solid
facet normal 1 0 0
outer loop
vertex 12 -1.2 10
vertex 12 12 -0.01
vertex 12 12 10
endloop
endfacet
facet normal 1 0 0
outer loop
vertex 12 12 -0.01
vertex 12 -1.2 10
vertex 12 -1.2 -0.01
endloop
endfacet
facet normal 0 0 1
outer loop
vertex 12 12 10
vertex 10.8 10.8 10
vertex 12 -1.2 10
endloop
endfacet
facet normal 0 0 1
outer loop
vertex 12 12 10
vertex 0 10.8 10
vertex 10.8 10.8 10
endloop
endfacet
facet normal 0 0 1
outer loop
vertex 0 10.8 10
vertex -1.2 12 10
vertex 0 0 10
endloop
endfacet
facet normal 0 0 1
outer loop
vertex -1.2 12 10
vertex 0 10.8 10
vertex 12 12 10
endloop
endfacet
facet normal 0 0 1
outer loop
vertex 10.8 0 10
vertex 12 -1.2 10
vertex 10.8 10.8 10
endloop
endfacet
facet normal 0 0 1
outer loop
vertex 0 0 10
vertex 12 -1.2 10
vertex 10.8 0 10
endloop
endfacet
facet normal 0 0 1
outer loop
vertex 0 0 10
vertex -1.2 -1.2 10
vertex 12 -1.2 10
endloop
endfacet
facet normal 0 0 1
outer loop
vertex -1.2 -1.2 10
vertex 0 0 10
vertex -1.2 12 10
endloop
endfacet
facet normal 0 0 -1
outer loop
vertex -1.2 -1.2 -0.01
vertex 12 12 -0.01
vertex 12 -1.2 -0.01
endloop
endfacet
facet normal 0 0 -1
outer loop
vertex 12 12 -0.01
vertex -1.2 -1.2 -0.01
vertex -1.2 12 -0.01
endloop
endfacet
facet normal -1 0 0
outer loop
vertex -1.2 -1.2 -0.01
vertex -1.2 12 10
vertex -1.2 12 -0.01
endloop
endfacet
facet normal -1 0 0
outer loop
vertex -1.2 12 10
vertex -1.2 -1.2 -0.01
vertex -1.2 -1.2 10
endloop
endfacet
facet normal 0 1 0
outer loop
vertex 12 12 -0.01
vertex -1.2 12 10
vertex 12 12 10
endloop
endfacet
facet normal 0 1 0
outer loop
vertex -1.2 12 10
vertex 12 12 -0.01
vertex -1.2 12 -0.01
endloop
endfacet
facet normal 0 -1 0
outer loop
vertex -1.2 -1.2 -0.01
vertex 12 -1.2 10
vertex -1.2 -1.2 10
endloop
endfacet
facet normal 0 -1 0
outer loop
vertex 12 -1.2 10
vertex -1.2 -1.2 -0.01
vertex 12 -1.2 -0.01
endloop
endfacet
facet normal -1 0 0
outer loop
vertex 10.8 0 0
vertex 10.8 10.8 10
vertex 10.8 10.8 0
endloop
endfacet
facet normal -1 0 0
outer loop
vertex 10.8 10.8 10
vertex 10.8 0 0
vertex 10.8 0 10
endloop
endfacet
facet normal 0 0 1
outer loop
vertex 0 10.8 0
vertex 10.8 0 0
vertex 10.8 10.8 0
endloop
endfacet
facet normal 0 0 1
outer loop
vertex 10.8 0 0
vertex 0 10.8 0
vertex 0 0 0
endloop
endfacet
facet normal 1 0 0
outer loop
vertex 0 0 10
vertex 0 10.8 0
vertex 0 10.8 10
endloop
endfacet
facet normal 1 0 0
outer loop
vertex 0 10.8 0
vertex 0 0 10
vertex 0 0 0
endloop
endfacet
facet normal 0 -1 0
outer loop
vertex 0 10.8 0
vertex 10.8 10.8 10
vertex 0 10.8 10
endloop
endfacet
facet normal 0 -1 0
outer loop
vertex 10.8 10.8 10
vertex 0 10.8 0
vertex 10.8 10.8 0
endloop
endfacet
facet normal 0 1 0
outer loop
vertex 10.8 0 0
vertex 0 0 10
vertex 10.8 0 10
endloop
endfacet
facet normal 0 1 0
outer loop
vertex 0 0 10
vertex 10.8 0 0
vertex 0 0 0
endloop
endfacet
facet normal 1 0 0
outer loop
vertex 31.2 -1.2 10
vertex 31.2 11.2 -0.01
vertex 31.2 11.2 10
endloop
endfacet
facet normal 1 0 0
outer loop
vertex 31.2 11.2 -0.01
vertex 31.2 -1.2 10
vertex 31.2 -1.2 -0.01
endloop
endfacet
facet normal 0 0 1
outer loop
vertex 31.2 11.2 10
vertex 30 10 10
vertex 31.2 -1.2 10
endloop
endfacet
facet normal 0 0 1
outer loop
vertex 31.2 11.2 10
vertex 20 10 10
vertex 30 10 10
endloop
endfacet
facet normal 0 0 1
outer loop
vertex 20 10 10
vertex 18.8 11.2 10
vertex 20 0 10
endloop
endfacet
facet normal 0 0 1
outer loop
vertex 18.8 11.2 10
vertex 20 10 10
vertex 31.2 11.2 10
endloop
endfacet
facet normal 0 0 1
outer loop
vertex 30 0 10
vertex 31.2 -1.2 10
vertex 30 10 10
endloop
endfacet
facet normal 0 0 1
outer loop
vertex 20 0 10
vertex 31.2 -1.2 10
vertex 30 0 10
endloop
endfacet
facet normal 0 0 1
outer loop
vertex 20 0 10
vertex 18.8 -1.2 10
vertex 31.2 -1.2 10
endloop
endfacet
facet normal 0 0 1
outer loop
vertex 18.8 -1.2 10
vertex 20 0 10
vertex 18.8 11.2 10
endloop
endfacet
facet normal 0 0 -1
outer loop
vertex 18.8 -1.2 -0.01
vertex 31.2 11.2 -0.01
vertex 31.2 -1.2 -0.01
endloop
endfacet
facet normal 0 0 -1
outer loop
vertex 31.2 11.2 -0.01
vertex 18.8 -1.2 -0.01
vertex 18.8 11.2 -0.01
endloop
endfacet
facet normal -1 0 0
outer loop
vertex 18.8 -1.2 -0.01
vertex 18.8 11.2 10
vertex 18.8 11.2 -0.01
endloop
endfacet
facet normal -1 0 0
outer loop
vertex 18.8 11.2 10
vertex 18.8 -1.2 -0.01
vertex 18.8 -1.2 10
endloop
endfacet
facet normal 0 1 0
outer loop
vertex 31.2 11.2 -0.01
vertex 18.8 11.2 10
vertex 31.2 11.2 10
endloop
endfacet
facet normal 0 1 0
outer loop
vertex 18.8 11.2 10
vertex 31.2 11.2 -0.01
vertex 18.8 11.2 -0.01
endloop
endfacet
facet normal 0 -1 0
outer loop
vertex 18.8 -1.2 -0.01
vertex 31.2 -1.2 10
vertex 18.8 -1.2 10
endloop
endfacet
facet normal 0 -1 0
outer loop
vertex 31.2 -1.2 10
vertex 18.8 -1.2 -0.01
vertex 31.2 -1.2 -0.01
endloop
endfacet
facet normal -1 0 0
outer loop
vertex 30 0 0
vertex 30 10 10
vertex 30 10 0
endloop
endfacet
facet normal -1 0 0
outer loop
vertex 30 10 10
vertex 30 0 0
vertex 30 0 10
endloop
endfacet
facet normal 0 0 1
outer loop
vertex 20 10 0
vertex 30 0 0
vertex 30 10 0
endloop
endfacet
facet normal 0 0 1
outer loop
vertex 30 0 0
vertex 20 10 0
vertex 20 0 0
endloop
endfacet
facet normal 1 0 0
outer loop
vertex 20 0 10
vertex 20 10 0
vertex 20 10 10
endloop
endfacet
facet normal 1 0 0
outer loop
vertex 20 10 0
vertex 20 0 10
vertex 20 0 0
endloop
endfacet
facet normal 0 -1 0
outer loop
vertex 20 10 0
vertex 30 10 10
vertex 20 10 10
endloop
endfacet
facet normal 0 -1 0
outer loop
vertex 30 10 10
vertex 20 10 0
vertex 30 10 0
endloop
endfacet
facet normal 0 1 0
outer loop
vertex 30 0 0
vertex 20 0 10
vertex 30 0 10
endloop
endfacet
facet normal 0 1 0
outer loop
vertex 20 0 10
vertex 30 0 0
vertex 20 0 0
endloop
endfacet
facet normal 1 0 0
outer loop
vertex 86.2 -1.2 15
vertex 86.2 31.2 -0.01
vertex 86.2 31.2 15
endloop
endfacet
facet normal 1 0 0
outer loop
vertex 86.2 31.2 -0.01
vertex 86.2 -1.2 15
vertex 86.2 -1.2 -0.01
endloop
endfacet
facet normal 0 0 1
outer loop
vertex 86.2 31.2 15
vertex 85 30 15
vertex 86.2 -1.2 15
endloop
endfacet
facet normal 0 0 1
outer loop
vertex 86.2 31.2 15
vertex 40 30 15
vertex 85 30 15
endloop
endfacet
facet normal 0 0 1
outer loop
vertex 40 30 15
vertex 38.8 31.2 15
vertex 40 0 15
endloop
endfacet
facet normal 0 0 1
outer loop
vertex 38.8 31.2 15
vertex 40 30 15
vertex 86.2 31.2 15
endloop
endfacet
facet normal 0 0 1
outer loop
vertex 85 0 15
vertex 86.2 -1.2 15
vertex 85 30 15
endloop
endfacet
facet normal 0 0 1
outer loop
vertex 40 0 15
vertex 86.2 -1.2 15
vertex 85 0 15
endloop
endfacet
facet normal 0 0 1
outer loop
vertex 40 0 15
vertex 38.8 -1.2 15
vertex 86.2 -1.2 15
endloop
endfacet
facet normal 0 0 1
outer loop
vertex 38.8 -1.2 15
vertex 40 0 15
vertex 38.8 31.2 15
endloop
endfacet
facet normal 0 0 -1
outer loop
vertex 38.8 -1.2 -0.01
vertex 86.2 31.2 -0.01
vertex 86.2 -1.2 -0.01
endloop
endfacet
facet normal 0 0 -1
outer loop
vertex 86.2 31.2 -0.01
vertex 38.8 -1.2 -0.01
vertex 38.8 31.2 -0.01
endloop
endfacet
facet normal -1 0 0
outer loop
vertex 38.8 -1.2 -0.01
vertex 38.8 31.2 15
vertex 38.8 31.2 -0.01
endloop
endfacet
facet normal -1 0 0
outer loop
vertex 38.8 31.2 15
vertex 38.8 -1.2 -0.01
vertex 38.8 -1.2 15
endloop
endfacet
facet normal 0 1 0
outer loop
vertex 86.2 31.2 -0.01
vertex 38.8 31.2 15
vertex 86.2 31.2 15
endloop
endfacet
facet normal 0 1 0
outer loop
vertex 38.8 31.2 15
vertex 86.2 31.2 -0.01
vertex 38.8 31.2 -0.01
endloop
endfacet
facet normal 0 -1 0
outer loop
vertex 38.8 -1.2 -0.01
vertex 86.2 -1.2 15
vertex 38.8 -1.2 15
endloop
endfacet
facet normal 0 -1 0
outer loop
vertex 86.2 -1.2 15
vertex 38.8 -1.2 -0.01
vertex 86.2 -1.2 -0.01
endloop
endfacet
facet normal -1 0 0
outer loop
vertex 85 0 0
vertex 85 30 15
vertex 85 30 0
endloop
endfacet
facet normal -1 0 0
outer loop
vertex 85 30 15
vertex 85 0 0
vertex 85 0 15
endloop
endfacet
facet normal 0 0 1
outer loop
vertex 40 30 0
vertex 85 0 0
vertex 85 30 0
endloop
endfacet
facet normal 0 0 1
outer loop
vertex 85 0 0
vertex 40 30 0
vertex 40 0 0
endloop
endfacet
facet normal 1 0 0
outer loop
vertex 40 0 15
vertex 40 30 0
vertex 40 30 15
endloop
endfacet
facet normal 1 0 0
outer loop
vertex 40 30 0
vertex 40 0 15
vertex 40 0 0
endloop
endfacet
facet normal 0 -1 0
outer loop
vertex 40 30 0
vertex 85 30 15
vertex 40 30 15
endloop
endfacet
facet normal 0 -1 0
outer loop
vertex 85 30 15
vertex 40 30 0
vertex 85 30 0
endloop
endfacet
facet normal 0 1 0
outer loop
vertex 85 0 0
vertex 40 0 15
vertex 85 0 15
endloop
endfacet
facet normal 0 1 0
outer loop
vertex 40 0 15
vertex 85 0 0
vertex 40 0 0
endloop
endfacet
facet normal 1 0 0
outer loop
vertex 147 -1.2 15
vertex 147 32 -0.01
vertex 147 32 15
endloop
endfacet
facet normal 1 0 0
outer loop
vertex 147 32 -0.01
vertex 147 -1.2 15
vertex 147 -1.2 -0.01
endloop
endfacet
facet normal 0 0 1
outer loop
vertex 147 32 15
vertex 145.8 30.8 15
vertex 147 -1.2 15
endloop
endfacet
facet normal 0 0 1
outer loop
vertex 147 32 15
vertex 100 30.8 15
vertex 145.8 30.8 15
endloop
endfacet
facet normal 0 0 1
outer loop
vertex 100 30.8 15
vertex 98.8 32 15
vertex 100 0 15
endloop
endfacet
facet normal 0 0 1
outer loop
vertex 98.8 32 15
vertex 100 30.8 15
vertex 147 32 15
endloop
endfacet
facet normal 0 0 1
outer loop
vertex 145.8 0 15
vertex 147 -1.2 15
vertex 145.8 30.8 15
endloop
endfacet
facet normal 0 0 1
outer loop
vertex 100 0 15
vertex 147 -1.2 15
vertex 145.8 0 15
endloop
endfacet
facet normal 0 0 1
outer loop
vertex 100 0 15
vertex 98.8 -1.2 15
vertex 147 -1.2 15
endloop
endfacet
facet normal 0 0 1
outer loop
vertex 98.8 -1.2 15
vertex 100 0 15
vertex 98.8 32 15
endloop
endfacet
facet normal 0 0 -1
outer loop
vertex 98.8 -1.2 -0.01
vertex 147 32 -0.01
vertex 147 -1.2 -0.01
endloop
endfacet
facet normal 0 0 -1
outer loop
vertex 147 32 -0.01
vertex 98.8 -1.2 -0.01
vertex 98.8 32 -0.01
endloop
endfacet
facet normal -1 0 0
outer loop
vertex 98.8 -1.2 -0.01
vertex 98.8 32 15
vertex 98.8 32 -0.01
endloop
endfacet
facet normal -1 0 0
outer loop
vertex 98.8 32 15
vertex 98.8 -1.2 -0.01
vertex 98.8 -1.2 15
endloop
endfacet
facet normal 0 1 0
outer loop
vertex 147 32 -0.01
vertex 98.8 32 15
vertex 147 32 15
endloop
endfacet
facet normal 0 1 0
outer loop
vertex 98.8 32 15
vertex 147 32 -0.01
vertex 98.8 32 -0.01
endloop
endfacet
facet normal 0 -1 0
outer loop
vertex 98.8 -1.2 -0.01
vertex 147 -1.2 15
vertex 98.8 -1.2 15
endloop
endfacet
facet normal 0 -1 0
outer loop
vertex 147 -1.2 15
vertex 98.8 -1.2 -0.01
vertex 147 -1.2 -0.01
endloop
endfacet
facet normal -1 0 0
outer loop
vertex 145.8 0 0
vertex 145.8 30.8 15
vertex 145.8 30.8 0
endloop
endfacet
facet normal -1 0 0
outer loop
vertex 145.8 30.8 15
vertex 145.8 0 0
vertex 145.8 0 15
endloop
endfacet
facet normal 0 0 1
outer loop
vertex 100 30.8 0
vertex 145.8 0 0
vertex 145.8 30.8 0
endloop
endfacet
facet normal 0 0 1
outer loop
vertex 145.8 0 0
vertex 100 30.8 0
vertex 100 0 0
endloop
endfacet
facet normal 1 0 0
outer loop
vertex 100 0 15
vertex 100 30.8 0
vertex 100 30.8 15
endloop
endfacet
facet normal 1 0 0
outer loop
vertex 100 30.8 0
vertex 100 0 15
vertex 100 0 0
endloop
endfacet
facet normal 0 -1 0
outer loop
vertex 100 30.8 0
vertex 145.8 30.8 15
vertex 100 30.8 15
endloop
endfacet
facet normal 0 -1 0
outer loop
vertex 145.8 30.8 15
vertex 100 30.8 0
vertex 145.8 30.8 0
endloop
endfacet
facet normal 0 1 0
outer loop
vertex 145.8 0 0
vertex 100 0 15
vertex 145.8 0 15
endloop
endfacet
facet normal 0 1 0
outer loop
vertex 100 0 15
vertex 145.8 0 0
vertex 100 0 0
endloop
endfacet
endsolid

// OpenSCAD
// file: ../../Base/Boxes.scad
// Fischertechnik Box Foundation
// Pre-designed Boxes

use <Constants.scad>

include <PlacementOptions.scad>

box190Width = 190;
box190Depth = 130;
box130Width = 130;
box130Depth = 95;
boxUsageHeight = 33.9;
boxWallThickness = 2.4;
boxBaseThickness = 1.0;

// getBoxWallThickness()
// Gets the wall thickness of a Fischertechnik Box

function getBoxWallThickness() = boxWallThickness;

// Gets the usable height of a fischertechnik box
function getBoxUsageHeight() = boxUsageHeight;

// Gets the thickness of the Fischertechnik box base.
function getBoxBaseThickness() = boxBaseThickness;

// Gets the usable inner space of a Box 190 as an x/y-list
function getBox190Space() = [
    box190Width - 2*getBoxWallThickness(), 
    box190Depth - 2*getBoxWallThickness() ];

// Imports the Fischertechnik empty box 130x190 mm and places it at position 0,0
// 190x130 are the outer sizes, the inner space is slightly smaller. Use getBox190Space() to get the inner sizes.
// This module needs the STL file "Fischertechnik Box 130x190.stl" in the library path.
// The box is positioned that the usable inner space is at the 0,0,0 position. The

module Box190() {
    translate([-getBoxWallThickness(),-getBoxWallThickness(),-getBoxBaseThickness()])
        import("Fischertechnik Box 130x190.stl", convexity=3);
}

// Gets the usable inner space of a Box 130 as an x/y-list
function getBox130Space() = [
    box130Width - 2*getBoxWallThickness(), 
    box130Depth - 2*getBoxWallThickness() ];

// Imports the Fischertechnik empty box 95x130 mm and places it at position 0,0
// 190x130 are the outer sizes, the inner space is slightly smaller. Use getBox190Space() to get the inner sizes.
// This module needs the STL file "Fischertechnik Box 95x130.stl" in the library path.
// The box is positioned that the usable inner space is at the 0,0,0 position. The

module Box130() {
    translate([-getBoxWallThickness(),-getBoxWallThickness(),-getBoxBaseThickness()])
        import("Fischertechnik Box 95x130.stl", convexity=3);
}

// Creates a web at the specified box walls
// corner 0 = LowerLeft, 1 = UpperLeft, 2 = UpperRight, 3 = LowerRight
// side 0 = LeftOfCorner, 1 = RightOfCorner
// distance = Distance in mm from the corner
// box = inner width and depth of the box (default: Box 190)
// webWidth = length of the web (default is 3 mms)
// webThickness = thickness of the web (default is 1 mm)

module BoxWeb(corner, side, distance, box=getBox190Space(), webWidth=3, webThickness=1.0) {
    sink = getBoxWallThickness()/2;

    width = (corner % 2 == 0) ? 
            (side == LeftOfCorner ? webWidth : webThickness) :
            (side == LeftOfCorner ? webThickness : webWidth);

    depth = (corner % 2 == 0) ? 
            (side == RightOfCorner ? webWidth : webThickness) :
            (side == RightOfCorner ? webThickness : webWidth);
    
    xDiff = corner == LowerLeft ? 
                (side == LeftOfCorner ? -sink : distance) :
            (corner == UpperLeft ?                
                (side == LeftOfCorner ? distance : -sink) :
            (corner == UpperRight ?
                (side == LeftOfCorner ? box.x-webWidth+sink : box.x-distance-webThickness) :
                (side == LeftOfCorner ? box.x-distance-webThickness: box.x-webWidth+sink)));

    yDiff = corner == LowerLeft ? 
                (side == RightOfCorner ? -sink : distance) :
            (corner == UpperLeft ?
                (side == RightOfCorner ? box.y-distance : box.y-webWidth+sink) :
            (corner == UpperRight ?
                (side == RightOfCorner ? box.y-webWidth+sink : box.y-distance) :
                (side == RightOfCorner ? distance : -sink)));
    
    translate([xDiff, yDiff, -getExcess()])
        cube([width, depth, boxUsageHeight + 2*getExcess()]);
}
// file: ../../Base/Rotation.scad
// Fischertechnik Box Foundation
// Geometry Helpers Rotation

include <PlacementOptions.scad>

// getRotatedSpace(space, rotation=NoRotation)
// Rotates the space dependent on the specified rotation

function getRotatedSpace(space, rotation=NoRotation) = [
    (rotation == Rotate90 || rotation == Rotate270) ? space.y : space.x,
    (rotation == Rotate90 || rotation == Rotate270) ? space.x : space.y
];

// Rotates the given space around the fixed left lower corner
// space = the space the children needs as width/depth list [width,depth]
// rotation = 0 Rotate0 degrees, 1 Rotate90 degrees, 2 Rotate180 degrees, 3 Rotate270 degrees (equivalent to -90)

module RotateFix(space, rotation=Rotate0) {
    dy = (rotation == Rotate0 || rotation == Rotate270) ? 0 :
        (rotation == Rotate90) ? space.x :
        space.y;
    dx = (rotation < Rotate180) ? 0 :
        (rotation == Rotate180) ? space.x :
        space.y;
    
    translate([dx, dy, 0])
        rotate([0, 0, rotations[rotation]])
            children();
}
// file: ../../Base/Alignment.scad
// Fischertechnik Box Foundation
// Geometry Helpers Alignment

include <PlacementOptions.scad>

// getAlignedX(elementWidth, spaceWidth, align=AlignRight, offset=0)
// Gets the aligned X offset of an element with the given
// width in the given space.
// elementWidth = The width of the element to positon
// spaceWidth = The space where the element should be aligned
// align = 0 AlignLeft, 1 AlignCenter, 2 AlignRight
// offset = an optional offset from the aligned position. When
// aligned left or centered, then positive values are in X direction.
// When aligned right then positive values are in negative X direction.

function getAlignedX(elementWidth, spaceWidth, align=AlignRight, offset=0) =
    (align == AlignLeft) ?
        offset :
        ((align == AlignCenter) ?
        (spaceWidth - elementWidth)/2 + offset :
        spaceWidth - offset - elementWidth);

// getAlignedY(elementDepth, spaceDepth, align=AlignTop, offset=0)
// Gets the aligned Y offset of an element with the given
// depth in the given space.
// elementDepth = The depth of the element to positon
// spaceDepth = The space where the element should be aligned
// align = 0 AlignBottom, 1 AlignCenter, 2 AlignTop
// offset = an optional offset from the aligned position. When
// aligned bottom or centered, then positive values are in Y direction.
// When aligned top then positive values are in negative Y direction.

function getAlignedY(elementDepth, spaceDepth, align=AlignTop, offset=0) =
    (align == AlignBottom) ?
        offset :
        ((align == AlignCenter) ?
        (spaceDepth - elementDepth)/2 + offset :
        spaceDepth - offset - elementDepth);
// file: ../../Base/PlacementOptions.scad
// Fischertechnik Box Foundation
// Placement Options

// Alignment
NoAlign = 0;
AlignLeft = 1;
AlignBottom = 2;
AlignCenter = 3;
AlignRight = 4;
AlignTop = 5;

// Element rotation degree steps
rotations = [0, -90, -180, -270];

// Rotation
NoRotation = 0;
Rotate0 = 0;
Rotate90 = 1;
Rotate180 = 2;
Rotate270 = 3;

// Docking (seen from above)
NoDock = -1;
DockLeft = 0;
DockTop = 1;
DockRight = 2;
DockCorner = 2;
DockBottom = 3;

// Web corners
LowerLeft = 0;
UpperLeft = 1;
UpperRight = 2;
LowerRight = 3;

// Web position relative to corner
LeftOfCorner = 0;
RightOfCorner = 1;
// file: ../../Base/Placement.scad
// Fischertechnik Box Foundation
// Geometry Helpers Placement

use <Constants.scad>
use <Alignment.scad>
use <Rotation.scad>
use <Boxes.scad>

include <PlacementOptions.scad>

// Place(x=0, y=0, elementSpace=[0,0], alignX=AlignLeft, alignY=AlignBottom, rotation=Rotate0, boxSpace=getBox190Space())
// Places the child at the specified position
// y = Y-Position. This is a relative position when an X aligment is specified.
// x = X-Position. This is a relative position when an Y aligment is specified.
// elementSpace = space of the element to be placed [x,y]
// alignX = -1=NoAlign, 0 AlignLeft, 1 AlignCenter, 3 AlignRight (elementSpace and boxSpace required!)
// alignY = -1=NoAlign, 2 AlignBottom, 1 AlignCenter, 4 AlignTop (elementSpace and boxSpace required!)
// rotation = 0 Rotate0 0 degrees, 1 Rotate90 90 degrees, 
// 2 Rotate180 180 degrees, 3 Rotate270 270 degrees (equivalent to -90)
// boxSpace = Inner space of the box where the placement occurs [x,y] - default is Box 190x130 inner space

module Place(x=0, y=0, elementSpace=[0,0], 
  alignX=AlignLeft, alignY=AlignBottom, 
  rotation=NoRotation, boxSpace=getBox190Space()) {

    module Position(x, y, space, rotation=Rotate0) {
        translate([x, y, 0])
            RotateFix(space, rotation)
                children(0);
    }

    space = getRotatedSpace(elementSpace, rotation);
    alignedX = getAlignedX(space.x, boxSpace.x, alignX, x);
    alignedY = getAlignedY(space.y, boxSpace.y, alignY, y);
    Position(alignedX, alignedY, elementSpace, rotation)
        children(0);
}

// Center(space=getBox130Space(), elementSpace=[0,0])
// space = Space where the children is centered. For cylinder use centered=true and no elementSpace.
// elementSpace = space of the element to be centered [x,y]

module Center(space=getBox190Space(), elementSpace=[0,0]) {
    translate([(space.x - elementSpace.x) / 2, (space.y - elementSpace.y) / 2])
        children(0);
}

// CenterHorizontal(width=0, y=0, offset=0, space=getBox130Space())
// space = Space where the children is centered. For cylinder use centered=true and no elementSpace.
// elementSpace = space of the element to be centered [x,y]

module CenterHorizontal(width=0, y=0, offset=0, space=getBox190Space()) {
    translate([(space.x - width) / 2 + offset, y])
        children(0);
}

// CenterVertical(depth=0, x=0, offset=0, space=getBox130Space())
// space = Space where the children is centered. For cylinder use centered=true and no elementSpace.
// elementSpace = space of the element to be centered [x,y]

module CenterVerticalal(depth=0, x=0, offset=0, space=getBox190Space()) {
    translate([x, (space.y - depth) / 2 + offset])
        children(0);
}
// file: ../../Base/Constants.scad
// Fischertechnik Box Foundation
// Constants

// Constant values necessary for multiple elements

// Base constants
dividerThickness = 1.2;
excess = 0.01;
fragments = 90;
tolerance = 0.8;

// Gets the thickness of a divider 
function getDividerThickness() = dividerThickness;

// Gets the excess that is used to merge walls into each other
function getExcess() = excess;

// Gets amount of fragments of a cylinder
function getFragments() = fragments;

// Gets the inner tolerance of a frame to each side
function getTolerance() = tolerance;


// Fischertechnik specific constants
axisDiameter = 4;
axisBottomDiameter = axisDiameter + 1;
standardEdgeDistance = 2.5;
standardWebDistance = 11.5;
standardCornerLength = 15;
tubeWallFactor = 1.6;

// Gets axis diameter
function getAxisDiameter() = axisDiameter;

// Gets axis bottom diameter for thicker part at the bottom
function getAxisBottomDiameter() = axisBottomDiameter;

// gets the standard distance to the wall of the box for dockable frames with webs
function getStandardEdgeDistance() = standardEdgeDistance;

// gets the standard distance of each web to the corner of the dockable frame
function getStandardWebDistance() = standardWebDistance;

// gets the standard length of the corner walls of a dockable frame
function getStandardCornerLength() = standardCornerLength;

// gets the wall thickness of a tube.
function getTubeWallThickness() = tubeWallFactor * getDividerThickness();
// main file
// Fischertechnik Box Foundation
// ModelBase
// Test Frame

use <../../Base/Constants.scad>
use <../../ModelBase/Simple.scad>

// With tolerance
translate([-getDividerThickness(), -getDividerThickness(), 0])
    Frame([10,10,10]);

// No tolerance
translate([20-getDividerThickness(), -getDividerThickness(), 0])
    Frame([10,10,10], 0);
    
// No tolerance
translate([40-getDividerThickness(), -getDividerThickness(), 0])
    Frame([45,30,15], 0);
    
// With tolerance
translate([100-getDividerThickness(), -getDividerThickness(), 0])
    Frame([45,30,15]);    
